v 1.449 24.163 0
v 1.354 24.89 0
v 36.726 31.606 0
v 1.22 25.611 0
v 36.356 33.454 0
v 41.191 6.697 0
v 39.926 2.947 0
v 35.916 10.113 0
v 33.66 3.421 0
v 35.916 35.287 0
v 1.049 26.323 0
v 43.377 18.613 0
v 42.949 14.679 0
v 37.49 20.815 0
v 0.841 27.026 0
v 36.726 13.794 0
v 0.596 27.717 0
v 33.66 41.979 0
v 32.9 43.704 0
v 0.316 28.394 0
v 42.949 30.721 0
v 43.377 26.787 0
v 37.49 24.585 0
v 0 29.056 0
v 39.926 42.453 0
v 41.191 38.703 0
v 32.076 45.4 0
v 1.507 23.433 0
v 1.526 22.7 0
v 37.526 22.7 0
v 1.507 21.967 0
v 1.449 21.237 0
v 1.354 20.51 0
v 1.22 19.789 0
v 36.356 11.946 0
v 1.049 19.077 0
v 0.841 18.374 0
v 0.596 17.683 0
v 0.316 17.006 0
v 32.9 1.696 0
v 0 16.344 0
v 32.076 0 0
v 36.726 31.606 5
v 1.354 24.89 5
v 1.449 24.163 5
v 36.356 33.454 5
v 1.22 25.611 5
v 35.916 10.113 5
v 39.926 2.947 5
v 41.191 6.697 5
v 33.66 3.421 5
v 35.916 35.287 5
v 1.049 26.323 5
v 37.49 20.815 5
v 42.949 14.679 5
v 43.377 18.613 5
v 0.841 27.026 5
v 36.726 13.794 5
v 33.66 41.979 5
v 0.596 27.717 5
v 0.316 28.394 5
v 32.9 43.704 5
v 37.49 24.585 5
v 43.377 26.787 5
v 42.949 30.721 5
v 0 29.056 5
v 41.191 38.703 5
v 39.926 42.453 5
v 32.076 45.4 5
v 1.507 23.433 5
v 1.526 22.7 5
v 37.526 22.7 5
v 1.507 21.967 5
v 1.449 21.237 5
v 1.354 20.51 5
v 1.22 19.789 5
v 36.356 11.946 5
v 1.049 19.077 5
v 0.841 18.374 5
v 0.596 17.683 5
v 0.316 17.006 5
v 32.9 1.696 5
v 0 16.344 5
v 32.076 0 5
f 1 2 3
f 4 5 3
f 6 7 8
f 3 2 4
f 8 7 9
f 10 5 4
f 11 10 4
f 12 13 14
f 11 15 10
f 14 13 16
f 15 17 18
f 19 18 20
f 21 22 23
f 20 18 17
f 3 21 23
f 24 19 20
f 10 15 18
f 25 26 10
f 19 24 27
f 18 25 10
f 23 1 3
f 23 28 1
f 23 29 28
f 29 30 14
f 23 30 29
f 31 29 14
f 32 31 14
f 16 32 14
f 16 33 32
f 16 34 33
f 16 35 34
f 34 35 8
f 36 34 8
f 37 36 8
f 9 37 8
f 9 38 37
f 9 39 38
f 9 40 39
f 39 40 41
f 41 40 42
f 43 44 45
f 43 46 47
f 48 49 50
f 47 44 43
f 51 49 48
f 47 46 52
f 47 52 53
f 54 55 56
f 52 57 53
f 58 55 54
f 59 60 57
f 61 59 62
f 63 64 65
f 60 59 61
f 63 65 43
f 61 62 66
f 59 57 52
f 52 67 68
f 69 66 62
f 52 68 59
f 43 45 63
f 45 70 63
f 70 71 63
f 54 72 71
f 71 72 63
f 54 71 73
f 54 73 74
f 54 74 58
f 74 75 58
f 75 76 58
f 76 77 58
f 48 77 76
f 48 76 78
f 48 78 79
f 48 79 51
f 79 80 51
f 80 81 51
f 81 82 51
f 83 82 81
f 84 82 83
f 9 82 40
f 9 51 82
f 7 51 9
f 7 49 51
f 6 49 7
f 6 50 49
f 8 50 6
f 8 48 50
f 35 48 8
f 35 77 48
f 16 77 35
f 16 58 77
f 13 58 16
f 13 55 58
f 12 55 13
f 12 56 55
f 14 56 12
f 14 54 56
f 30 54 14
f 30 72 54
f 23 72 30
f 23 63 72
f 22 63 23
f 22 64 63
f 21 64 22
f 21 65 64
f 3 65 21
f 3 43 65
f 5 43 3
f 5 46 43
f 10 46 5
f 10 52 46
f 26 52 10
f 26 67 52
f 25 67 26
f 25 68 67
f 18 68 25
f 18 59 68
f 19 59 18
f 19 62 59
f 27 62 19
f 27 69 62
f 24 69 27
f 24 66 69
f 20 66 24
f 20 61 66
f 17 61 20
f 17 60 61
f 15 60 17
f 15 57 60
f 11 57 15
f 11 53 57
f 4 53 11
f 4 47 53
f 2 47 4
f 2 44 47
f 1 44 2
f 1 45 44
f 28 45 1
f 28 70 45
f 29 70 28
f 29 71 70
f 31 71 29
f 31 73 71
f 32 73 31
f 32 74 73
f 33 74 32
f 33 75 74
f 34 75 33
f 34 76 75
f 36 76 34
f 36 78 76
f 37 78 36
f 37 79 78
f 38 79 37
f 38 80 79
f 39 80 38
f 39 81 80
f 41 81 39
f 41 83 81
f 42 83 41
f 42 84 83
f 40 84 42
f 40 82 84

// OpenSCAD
$fn = 32;

// ----------------------------------------------------------------------
// Gear sector: 4 teeth on 54 degrees
// ----------------------------------------------------------------------

// --- parameters (mm) ---
sector_angle = 54;        // sector angle, degrees
root_r = 50;              // root circle radius
tooth_h = 6;              // tooth height over the root circle
teeth = 4;                // number of teeth on the sector
hub_r = 14;               // hub bore radius
plate_t = 5;              // sector thickness, Z
arc_step = 3;             // sampling step of the root/hub arcs, degrees

tip_r = root_r + tooth_h;  // tip circle radius

profile = [[32.076, 0], [32.9, 1.696], [33.66, 3.421], [39.926, 2.947], [41.191, 6.697], [35.916, 10.113], [36.356, 11.946], [36.726, 13.794], [42.949, 14.679], [43.377, 18.613], [37.49, 20.815], [37.526, 22.7], [37.49, 24.585], [43.377, 26.787], [42.949, 30.721], [36.726, 31.606], [36.356, 33.454], [35.916, 35.287], [41.191, 38.703], [39.926, 42.453], [33.66, 41.979], [32.9, 43.704], [32.076, 45.4], [0, 29.056], [0.316, 28.394], [0.596, 27.717], [0.841, 27.026], [1.049, 26.323], [1.22, 25.611], [1.354, 24.89], [1.449, 24.163], [1.507, 23.433], [1.526, 22.7], [1.507, 21.967], [1.449, 21.237], [1.354, 20.51], [1.22, 19.789], [1.049, 19.077], [0.841, 18.374], [0.596, 17.683], [0.316, 17.006], [0, 16.344]];  // primary outline, 42 points, counter clockwise

// --- the one profile operation ---
linear_extrude(height = plate_t) polygon(points = profile);
